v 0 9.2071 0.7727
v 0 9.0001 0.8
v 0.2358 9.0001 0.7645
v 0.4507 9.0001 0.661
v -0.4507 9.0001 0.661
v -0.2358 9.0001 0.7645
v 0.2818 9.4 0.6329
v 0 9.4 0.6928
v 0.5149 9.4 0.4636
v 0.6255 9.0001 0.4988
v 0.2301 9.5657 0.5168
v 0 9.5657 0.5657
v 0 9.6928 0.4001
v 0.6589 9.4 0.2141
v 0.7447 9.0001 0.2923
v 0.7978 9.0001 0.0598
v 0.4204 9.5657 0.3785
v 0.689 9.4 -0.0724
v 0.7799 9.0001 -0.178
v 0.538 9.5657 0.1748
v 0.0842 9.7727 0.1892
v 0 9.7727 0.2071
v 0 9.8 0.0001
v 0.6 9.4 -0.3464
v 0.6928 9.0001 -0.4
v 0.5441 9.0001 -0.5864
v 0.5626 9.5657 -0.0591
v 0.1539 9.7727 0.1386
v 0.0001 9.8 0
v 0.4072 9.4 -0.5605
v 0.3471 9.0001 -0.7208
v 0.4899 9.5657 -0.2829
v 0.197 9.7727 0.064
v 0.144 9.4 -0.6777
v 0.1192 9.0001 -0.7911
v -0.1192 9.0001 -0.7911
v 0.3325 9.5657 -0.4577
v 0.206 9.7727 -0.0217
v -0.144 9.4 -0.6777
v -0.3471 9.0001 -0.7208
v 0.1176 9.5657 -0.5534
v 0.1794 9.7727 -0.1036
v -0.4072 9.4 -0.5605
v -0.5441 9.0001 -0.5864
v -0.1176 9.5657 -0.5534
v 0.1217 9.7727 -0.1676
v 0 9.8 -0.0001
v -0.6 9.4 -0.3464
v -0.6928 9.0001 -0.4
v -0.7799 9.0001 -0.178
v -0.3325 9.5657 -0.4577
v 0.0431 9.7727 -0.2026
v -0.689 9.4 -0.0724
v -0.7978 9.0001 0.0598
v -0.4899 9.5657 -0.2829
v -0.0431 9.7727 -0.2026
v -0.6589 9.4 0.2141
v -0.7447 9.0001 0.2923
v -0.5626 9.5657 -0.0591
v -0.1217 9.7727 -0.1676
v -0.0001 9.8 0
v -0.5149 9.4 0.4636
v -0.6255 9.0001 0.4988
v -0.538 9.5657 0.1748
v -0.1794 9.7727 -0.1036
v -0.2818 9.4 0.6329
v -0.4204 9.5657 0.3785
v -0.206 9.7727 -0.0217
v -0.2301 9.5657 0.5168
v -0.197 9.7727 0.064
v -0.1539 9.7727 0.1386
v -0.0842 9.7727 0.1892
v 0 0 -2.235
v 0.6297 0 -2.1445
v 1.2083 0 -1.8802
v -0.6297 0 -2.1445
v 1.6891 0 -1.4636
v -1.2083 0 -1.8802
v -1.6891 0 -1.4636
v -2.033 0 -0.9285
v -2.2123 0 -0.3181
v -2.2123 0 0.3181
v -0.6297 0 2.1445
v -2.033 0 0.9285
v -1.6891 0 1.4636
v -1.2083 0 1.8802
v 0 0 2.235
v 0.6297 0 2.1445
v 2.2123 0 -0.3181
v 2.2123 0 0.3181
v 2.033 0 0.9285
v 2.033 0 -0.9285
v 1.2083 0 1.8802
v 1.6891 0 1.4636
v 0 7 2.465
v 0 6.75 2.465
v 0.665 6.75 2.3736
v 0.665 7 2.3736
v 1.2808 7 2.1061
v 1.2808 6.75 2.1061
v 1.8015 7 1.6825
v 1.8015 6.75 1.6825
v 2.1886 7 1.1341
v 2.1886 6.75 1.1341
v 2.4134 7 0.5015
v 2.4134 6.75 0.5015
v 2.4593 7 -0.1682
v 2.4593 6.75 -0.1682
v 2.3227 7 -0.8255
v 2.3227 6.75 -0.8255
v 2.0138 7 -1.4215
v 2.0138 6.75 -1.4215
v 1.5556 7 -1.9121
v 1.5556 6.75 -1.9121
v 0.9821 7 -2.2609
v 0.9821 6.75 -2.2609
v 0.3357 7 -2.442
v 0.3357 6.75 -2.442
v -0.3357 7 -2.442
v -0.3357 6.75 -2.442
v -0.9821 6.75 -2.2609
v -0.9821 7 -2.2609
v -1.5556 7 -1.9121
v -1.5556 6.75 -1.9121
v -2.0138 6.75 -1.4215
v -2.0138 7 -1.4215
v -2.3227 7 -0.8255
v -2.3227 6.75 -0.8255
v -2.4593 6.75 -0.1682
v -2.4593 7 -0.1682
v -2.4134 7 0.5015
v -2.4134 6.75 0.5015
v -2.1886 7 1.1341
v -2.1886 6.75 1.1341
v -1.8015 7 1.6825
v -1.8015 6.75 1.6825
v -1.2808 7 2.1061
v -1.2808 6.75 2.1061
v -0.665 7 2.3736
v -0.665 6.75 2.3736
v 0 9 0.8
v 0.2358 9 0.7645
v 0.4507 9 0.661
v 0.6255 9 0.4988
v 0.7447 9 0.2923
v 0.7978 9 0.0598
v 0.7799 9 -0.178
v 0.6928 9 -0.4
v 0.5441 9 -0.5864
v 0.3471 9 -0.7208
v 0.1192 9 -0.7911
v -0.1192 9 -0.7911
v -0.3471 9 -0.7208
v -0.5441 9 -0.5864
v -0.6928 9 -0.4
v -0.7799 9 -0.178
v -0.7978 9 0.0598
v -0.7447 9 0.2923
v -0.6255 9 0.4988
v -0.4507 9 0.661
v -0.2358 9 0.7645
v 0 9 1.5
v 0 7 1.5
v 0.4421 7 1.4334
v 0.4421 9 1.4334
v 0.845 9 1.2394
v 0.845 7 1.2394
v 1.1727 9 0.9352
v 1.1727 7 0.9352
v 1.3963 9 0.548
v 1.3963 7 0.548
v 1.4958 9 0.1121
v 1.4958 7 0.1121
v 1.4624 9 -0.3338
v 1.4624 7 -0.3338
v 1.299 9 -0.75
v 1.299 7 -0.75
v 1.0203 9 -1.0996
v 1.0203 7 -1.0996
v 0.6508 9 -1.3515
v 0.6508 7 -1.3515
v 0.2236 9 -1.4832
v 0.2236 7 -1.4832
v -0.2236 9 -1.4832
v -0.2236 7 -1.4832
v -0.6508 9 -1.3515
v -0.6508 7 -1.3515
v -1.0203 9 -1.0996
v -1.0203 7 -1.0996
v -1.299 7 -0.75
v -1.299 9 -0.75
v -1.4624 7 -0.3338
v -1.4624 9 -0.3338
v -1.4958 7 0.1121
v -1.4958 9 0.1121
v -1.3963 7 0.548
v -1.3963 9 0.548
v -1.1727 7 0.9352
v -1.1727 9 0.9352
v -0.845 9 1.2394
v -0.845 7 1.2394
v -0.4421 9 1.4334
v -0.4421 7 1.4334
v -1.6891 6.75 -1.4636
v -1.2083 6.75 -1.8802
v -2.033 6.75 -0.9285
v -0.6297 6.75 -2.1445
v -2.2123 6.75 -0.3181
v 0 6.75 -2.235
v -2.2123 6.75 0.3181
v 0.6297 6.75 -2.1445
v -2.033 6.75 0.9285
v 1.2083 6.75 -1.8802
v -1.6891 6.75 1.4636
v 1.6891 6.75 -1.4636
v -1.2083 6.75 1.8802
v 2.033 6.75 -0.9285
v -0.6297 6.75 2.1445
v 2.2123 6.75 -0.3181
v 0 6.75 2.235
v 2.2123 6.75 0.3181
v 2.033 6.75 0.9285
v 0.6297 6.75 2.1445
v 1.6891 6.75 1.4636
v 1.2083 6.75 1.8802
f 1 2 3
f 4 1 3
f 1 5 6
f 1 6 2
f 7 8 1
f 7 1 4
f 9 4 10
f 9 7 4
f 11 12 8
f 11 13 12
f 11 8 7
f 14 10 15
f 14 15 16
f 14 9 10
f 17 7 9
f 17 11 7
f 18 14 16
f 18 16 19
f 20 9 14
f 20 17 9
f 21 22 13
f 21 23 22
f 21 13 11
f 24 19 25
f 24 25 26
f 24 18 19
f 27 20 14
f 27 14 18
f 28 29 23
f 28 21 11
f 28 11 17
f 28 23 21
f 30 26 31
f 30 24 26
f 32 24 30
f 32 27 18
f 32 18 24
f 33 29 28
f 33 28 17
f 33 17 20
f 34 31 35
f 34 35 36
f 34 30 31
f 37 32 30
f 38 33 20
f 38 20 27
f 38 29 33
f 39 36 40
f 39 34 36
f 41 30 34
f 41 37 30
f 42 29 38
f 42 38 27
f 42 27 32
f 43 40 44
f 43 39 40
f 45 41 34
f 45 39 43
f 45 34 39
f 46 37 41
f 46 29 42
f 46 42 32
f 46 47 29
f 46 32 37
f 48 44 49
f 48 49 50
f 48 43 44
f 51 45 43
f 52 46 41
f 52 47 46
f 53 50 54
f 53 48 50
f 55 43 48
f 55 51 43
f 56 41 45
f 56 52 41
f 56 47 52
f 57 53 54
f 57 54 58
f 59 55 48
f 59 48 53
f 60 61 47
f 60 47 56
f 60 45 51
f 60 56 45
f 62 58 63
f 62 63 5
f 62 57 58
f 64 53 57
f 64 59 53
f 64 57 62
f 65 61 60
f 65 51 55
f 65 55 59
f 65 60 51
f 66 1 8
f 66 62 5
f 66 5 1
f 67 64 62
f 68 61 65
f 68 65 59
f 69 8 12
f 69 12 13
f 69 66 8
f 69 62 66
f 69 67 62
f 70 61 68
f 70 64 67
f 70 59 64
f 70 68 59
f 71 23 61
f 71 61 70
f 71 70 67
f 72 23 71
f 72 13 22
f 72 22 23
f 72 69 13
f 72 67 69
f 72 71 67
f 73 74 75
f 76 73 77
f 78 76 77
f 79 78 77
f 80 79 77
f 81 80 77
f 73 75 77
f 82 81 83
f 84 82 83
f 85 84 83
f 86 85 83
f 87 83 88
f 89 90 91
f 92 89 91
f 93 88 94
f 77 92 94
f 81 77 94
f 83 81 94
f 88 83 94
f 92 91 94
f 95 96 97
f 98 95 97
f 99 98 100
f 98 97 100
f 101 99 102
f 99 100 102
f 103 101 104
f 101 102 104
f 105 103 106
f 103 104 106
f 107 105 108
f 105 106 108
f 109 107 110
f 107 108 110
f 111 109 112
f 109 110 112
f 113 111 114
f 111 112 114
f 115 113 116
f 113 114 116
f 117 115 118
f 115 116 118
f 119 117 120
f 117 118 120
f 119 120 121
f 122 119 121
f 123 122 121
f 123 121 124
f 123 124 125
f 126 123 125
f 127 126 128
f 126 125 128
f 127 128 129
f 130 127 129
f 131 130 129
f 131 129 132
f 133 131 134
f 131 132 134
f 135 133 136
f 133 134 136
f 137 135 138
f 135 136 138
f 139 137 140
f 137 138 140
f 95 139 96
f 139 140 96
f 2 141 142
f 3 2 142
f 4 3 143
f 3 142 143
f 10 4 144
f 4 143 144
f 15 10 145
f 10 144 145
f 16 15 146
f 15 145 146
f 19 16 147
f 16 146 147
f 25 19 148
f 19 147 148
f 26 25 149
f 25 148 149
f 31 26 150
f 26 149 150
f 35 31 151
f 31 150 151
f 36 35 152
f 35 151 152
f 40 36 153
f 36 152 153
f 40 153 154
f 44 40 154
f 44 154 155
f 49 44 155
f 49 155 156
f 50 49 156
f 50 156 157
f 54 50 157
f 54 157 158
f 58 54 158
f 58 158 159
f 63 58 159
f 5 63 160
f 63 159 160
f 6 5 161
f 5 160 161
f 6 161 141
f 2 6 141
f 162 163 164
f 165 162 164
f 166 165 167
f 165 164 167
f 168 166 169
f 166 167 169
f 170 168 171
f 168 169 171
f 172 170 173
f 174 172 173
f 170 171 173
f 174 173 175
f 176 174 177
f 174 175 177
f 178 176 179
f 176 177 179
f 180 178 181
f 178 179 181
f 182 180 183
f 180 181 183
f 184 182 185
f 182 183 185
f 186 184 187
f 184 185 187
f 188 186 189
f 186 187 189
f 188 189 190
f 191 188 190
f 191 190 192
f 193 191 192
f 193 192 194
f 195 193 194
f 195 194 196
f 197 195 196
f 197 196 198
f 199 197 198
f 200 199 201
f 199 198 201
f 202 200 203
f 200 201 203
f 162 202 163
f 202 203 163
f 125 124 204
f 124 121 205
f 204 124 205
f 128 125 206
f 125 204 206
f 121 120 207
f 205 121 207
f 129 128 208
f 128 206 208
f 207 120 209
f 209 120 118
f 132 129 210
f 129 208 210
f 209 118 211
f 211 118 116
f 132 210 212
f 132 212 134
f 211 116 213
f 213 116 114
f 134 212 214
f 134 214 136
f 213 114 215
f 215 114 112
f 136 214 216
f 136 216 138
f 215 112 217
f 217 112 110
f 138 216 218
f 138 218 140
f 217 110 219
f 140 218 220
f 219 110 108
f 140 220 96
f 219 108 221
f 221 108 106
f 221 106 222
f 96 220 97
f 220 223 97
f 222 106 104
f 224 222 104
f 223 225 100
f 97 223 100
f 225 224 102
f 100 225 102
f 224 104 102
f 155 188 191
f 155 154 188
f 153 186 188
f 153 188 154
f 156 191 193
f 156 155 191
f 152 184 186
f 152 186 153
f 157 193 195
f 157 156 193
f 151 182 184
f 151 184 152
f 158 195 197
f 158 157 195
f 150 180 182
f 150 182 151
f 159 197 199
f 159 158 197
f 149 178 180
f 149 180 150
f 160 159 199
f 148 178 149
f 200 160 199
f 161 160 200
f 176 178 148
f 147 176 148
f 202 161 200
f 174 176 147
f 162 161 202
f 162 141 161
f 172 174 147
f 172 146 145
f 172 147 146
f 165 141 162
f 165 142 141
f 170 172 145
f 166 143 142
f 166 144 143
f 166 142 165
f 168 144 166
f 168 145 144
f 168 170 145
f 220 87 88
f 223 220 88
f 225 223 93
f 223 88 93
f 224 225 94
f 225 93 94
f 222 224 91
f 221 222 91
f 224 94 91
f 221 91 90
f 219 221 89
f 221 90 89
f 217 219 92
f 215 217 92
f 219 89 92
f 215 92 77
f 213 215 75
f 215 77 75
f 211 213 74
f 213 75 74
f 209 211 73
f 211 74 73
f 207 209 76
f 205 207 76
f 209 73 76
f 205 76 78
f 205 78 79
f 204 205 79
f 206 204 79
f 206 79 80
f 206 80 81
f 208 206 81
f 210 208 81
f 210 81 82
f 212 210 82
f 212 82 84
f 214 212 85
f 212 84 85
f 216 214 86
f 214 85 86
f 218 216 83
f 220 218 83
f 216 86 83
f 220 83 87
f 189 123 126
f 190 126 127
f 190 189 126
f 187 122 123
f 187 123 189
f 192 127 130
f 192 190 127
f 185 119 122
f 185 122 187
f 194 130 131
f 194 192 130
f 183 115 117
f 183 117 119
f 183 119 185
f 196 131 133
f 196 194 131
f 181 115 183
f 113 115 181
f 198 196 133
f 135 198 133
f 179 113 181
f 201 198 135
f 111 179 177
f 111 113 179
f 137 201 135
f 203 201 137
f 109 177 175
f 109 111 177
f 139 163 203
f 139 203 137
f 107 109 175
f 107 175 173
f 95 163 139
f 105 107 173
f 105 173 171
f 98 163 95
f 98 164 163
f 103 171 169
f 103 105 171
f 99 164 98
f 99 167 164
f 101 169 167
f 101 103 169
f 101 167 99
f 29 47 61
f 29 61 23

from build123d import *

# Parameters (mm, degrees)
SKETCH1_R           = 2.235
BOSS_EXTRUDE1_DEPTH = 6.75
SKETCH2_R           = 2.465
BOSS_EXTRUDE2_DEPTH = 0.25
SKETCH4_R           = 1.5
BOSS_EXTRUDE3_DEPTH = 2
SKETCH5_R           = 0.8
BOSS_EXTRUDE4_DEPTH = 0.8
FILLET1_R           = 0.8


with BuildPart() as part:
    # Sketch1 → Boss-Extrude1 (new body)
    with BuildSketch(Plane(origin=(0, 0, 0), x_dir=(1, 0, 0), z_dir=(0, 1, 0))):
        with Locations(Location((0, 0, 0), (0, 0, 270))):
            Circle(SKETCH1_R)
    extrude(amount=BOSS_EXTRUDE1_DEPTH)

    # Sketch2 → Boss-Extrude2 (add)
    with BuildSketch(Plane(origin=(0, 6.75, 0), x_dir=(1, 0, 0), z_dir=(0, 1, 0))):
        with Locations(Location((0, 0, 0), (0, 0, 270))):
            Circle(SKETCH2_R)
    extrude(amount=BOSS_EXTRUDE2_DEPTH)

    # Sketch4 → Boss-Extrude3 (add)
    with BuildSketch(Plane(origin=(0, 7, 0), x_dir=(1, 0, 0), z_dir=(0, 1, 0))):
        with Locations(Location((0, 0, 0), (0, 0, 270))):
            Circle(SKETCH4_R)
    extrude(amount=BOSS_EXTRUDE3_DEPTH)

    # Sketch5 → Boss-Extrude4 (add)
    with BuildSketch(Plane(origin=(0, 9, 0), x_dir=(1, 0, 0), z_dir=(0, 1, 0))):
        with Locations(Location((0, 0, 0), (0, 0, 270))):
            Circle(SKETCH5_R)
    extrude(amount=BOSS_EXTRUDE4_DEPTH)

    # Fillet1
    fillet1_edges = [part.edges().sort_by_distance(p)[0] for p in [
        (0, 9.8, -0.8),
    ]]
    fillet(fillet1_edges, radius=FILLET1_R - 0.0001)  # a hair under: the kernel refuses the full size


solid = part.part
